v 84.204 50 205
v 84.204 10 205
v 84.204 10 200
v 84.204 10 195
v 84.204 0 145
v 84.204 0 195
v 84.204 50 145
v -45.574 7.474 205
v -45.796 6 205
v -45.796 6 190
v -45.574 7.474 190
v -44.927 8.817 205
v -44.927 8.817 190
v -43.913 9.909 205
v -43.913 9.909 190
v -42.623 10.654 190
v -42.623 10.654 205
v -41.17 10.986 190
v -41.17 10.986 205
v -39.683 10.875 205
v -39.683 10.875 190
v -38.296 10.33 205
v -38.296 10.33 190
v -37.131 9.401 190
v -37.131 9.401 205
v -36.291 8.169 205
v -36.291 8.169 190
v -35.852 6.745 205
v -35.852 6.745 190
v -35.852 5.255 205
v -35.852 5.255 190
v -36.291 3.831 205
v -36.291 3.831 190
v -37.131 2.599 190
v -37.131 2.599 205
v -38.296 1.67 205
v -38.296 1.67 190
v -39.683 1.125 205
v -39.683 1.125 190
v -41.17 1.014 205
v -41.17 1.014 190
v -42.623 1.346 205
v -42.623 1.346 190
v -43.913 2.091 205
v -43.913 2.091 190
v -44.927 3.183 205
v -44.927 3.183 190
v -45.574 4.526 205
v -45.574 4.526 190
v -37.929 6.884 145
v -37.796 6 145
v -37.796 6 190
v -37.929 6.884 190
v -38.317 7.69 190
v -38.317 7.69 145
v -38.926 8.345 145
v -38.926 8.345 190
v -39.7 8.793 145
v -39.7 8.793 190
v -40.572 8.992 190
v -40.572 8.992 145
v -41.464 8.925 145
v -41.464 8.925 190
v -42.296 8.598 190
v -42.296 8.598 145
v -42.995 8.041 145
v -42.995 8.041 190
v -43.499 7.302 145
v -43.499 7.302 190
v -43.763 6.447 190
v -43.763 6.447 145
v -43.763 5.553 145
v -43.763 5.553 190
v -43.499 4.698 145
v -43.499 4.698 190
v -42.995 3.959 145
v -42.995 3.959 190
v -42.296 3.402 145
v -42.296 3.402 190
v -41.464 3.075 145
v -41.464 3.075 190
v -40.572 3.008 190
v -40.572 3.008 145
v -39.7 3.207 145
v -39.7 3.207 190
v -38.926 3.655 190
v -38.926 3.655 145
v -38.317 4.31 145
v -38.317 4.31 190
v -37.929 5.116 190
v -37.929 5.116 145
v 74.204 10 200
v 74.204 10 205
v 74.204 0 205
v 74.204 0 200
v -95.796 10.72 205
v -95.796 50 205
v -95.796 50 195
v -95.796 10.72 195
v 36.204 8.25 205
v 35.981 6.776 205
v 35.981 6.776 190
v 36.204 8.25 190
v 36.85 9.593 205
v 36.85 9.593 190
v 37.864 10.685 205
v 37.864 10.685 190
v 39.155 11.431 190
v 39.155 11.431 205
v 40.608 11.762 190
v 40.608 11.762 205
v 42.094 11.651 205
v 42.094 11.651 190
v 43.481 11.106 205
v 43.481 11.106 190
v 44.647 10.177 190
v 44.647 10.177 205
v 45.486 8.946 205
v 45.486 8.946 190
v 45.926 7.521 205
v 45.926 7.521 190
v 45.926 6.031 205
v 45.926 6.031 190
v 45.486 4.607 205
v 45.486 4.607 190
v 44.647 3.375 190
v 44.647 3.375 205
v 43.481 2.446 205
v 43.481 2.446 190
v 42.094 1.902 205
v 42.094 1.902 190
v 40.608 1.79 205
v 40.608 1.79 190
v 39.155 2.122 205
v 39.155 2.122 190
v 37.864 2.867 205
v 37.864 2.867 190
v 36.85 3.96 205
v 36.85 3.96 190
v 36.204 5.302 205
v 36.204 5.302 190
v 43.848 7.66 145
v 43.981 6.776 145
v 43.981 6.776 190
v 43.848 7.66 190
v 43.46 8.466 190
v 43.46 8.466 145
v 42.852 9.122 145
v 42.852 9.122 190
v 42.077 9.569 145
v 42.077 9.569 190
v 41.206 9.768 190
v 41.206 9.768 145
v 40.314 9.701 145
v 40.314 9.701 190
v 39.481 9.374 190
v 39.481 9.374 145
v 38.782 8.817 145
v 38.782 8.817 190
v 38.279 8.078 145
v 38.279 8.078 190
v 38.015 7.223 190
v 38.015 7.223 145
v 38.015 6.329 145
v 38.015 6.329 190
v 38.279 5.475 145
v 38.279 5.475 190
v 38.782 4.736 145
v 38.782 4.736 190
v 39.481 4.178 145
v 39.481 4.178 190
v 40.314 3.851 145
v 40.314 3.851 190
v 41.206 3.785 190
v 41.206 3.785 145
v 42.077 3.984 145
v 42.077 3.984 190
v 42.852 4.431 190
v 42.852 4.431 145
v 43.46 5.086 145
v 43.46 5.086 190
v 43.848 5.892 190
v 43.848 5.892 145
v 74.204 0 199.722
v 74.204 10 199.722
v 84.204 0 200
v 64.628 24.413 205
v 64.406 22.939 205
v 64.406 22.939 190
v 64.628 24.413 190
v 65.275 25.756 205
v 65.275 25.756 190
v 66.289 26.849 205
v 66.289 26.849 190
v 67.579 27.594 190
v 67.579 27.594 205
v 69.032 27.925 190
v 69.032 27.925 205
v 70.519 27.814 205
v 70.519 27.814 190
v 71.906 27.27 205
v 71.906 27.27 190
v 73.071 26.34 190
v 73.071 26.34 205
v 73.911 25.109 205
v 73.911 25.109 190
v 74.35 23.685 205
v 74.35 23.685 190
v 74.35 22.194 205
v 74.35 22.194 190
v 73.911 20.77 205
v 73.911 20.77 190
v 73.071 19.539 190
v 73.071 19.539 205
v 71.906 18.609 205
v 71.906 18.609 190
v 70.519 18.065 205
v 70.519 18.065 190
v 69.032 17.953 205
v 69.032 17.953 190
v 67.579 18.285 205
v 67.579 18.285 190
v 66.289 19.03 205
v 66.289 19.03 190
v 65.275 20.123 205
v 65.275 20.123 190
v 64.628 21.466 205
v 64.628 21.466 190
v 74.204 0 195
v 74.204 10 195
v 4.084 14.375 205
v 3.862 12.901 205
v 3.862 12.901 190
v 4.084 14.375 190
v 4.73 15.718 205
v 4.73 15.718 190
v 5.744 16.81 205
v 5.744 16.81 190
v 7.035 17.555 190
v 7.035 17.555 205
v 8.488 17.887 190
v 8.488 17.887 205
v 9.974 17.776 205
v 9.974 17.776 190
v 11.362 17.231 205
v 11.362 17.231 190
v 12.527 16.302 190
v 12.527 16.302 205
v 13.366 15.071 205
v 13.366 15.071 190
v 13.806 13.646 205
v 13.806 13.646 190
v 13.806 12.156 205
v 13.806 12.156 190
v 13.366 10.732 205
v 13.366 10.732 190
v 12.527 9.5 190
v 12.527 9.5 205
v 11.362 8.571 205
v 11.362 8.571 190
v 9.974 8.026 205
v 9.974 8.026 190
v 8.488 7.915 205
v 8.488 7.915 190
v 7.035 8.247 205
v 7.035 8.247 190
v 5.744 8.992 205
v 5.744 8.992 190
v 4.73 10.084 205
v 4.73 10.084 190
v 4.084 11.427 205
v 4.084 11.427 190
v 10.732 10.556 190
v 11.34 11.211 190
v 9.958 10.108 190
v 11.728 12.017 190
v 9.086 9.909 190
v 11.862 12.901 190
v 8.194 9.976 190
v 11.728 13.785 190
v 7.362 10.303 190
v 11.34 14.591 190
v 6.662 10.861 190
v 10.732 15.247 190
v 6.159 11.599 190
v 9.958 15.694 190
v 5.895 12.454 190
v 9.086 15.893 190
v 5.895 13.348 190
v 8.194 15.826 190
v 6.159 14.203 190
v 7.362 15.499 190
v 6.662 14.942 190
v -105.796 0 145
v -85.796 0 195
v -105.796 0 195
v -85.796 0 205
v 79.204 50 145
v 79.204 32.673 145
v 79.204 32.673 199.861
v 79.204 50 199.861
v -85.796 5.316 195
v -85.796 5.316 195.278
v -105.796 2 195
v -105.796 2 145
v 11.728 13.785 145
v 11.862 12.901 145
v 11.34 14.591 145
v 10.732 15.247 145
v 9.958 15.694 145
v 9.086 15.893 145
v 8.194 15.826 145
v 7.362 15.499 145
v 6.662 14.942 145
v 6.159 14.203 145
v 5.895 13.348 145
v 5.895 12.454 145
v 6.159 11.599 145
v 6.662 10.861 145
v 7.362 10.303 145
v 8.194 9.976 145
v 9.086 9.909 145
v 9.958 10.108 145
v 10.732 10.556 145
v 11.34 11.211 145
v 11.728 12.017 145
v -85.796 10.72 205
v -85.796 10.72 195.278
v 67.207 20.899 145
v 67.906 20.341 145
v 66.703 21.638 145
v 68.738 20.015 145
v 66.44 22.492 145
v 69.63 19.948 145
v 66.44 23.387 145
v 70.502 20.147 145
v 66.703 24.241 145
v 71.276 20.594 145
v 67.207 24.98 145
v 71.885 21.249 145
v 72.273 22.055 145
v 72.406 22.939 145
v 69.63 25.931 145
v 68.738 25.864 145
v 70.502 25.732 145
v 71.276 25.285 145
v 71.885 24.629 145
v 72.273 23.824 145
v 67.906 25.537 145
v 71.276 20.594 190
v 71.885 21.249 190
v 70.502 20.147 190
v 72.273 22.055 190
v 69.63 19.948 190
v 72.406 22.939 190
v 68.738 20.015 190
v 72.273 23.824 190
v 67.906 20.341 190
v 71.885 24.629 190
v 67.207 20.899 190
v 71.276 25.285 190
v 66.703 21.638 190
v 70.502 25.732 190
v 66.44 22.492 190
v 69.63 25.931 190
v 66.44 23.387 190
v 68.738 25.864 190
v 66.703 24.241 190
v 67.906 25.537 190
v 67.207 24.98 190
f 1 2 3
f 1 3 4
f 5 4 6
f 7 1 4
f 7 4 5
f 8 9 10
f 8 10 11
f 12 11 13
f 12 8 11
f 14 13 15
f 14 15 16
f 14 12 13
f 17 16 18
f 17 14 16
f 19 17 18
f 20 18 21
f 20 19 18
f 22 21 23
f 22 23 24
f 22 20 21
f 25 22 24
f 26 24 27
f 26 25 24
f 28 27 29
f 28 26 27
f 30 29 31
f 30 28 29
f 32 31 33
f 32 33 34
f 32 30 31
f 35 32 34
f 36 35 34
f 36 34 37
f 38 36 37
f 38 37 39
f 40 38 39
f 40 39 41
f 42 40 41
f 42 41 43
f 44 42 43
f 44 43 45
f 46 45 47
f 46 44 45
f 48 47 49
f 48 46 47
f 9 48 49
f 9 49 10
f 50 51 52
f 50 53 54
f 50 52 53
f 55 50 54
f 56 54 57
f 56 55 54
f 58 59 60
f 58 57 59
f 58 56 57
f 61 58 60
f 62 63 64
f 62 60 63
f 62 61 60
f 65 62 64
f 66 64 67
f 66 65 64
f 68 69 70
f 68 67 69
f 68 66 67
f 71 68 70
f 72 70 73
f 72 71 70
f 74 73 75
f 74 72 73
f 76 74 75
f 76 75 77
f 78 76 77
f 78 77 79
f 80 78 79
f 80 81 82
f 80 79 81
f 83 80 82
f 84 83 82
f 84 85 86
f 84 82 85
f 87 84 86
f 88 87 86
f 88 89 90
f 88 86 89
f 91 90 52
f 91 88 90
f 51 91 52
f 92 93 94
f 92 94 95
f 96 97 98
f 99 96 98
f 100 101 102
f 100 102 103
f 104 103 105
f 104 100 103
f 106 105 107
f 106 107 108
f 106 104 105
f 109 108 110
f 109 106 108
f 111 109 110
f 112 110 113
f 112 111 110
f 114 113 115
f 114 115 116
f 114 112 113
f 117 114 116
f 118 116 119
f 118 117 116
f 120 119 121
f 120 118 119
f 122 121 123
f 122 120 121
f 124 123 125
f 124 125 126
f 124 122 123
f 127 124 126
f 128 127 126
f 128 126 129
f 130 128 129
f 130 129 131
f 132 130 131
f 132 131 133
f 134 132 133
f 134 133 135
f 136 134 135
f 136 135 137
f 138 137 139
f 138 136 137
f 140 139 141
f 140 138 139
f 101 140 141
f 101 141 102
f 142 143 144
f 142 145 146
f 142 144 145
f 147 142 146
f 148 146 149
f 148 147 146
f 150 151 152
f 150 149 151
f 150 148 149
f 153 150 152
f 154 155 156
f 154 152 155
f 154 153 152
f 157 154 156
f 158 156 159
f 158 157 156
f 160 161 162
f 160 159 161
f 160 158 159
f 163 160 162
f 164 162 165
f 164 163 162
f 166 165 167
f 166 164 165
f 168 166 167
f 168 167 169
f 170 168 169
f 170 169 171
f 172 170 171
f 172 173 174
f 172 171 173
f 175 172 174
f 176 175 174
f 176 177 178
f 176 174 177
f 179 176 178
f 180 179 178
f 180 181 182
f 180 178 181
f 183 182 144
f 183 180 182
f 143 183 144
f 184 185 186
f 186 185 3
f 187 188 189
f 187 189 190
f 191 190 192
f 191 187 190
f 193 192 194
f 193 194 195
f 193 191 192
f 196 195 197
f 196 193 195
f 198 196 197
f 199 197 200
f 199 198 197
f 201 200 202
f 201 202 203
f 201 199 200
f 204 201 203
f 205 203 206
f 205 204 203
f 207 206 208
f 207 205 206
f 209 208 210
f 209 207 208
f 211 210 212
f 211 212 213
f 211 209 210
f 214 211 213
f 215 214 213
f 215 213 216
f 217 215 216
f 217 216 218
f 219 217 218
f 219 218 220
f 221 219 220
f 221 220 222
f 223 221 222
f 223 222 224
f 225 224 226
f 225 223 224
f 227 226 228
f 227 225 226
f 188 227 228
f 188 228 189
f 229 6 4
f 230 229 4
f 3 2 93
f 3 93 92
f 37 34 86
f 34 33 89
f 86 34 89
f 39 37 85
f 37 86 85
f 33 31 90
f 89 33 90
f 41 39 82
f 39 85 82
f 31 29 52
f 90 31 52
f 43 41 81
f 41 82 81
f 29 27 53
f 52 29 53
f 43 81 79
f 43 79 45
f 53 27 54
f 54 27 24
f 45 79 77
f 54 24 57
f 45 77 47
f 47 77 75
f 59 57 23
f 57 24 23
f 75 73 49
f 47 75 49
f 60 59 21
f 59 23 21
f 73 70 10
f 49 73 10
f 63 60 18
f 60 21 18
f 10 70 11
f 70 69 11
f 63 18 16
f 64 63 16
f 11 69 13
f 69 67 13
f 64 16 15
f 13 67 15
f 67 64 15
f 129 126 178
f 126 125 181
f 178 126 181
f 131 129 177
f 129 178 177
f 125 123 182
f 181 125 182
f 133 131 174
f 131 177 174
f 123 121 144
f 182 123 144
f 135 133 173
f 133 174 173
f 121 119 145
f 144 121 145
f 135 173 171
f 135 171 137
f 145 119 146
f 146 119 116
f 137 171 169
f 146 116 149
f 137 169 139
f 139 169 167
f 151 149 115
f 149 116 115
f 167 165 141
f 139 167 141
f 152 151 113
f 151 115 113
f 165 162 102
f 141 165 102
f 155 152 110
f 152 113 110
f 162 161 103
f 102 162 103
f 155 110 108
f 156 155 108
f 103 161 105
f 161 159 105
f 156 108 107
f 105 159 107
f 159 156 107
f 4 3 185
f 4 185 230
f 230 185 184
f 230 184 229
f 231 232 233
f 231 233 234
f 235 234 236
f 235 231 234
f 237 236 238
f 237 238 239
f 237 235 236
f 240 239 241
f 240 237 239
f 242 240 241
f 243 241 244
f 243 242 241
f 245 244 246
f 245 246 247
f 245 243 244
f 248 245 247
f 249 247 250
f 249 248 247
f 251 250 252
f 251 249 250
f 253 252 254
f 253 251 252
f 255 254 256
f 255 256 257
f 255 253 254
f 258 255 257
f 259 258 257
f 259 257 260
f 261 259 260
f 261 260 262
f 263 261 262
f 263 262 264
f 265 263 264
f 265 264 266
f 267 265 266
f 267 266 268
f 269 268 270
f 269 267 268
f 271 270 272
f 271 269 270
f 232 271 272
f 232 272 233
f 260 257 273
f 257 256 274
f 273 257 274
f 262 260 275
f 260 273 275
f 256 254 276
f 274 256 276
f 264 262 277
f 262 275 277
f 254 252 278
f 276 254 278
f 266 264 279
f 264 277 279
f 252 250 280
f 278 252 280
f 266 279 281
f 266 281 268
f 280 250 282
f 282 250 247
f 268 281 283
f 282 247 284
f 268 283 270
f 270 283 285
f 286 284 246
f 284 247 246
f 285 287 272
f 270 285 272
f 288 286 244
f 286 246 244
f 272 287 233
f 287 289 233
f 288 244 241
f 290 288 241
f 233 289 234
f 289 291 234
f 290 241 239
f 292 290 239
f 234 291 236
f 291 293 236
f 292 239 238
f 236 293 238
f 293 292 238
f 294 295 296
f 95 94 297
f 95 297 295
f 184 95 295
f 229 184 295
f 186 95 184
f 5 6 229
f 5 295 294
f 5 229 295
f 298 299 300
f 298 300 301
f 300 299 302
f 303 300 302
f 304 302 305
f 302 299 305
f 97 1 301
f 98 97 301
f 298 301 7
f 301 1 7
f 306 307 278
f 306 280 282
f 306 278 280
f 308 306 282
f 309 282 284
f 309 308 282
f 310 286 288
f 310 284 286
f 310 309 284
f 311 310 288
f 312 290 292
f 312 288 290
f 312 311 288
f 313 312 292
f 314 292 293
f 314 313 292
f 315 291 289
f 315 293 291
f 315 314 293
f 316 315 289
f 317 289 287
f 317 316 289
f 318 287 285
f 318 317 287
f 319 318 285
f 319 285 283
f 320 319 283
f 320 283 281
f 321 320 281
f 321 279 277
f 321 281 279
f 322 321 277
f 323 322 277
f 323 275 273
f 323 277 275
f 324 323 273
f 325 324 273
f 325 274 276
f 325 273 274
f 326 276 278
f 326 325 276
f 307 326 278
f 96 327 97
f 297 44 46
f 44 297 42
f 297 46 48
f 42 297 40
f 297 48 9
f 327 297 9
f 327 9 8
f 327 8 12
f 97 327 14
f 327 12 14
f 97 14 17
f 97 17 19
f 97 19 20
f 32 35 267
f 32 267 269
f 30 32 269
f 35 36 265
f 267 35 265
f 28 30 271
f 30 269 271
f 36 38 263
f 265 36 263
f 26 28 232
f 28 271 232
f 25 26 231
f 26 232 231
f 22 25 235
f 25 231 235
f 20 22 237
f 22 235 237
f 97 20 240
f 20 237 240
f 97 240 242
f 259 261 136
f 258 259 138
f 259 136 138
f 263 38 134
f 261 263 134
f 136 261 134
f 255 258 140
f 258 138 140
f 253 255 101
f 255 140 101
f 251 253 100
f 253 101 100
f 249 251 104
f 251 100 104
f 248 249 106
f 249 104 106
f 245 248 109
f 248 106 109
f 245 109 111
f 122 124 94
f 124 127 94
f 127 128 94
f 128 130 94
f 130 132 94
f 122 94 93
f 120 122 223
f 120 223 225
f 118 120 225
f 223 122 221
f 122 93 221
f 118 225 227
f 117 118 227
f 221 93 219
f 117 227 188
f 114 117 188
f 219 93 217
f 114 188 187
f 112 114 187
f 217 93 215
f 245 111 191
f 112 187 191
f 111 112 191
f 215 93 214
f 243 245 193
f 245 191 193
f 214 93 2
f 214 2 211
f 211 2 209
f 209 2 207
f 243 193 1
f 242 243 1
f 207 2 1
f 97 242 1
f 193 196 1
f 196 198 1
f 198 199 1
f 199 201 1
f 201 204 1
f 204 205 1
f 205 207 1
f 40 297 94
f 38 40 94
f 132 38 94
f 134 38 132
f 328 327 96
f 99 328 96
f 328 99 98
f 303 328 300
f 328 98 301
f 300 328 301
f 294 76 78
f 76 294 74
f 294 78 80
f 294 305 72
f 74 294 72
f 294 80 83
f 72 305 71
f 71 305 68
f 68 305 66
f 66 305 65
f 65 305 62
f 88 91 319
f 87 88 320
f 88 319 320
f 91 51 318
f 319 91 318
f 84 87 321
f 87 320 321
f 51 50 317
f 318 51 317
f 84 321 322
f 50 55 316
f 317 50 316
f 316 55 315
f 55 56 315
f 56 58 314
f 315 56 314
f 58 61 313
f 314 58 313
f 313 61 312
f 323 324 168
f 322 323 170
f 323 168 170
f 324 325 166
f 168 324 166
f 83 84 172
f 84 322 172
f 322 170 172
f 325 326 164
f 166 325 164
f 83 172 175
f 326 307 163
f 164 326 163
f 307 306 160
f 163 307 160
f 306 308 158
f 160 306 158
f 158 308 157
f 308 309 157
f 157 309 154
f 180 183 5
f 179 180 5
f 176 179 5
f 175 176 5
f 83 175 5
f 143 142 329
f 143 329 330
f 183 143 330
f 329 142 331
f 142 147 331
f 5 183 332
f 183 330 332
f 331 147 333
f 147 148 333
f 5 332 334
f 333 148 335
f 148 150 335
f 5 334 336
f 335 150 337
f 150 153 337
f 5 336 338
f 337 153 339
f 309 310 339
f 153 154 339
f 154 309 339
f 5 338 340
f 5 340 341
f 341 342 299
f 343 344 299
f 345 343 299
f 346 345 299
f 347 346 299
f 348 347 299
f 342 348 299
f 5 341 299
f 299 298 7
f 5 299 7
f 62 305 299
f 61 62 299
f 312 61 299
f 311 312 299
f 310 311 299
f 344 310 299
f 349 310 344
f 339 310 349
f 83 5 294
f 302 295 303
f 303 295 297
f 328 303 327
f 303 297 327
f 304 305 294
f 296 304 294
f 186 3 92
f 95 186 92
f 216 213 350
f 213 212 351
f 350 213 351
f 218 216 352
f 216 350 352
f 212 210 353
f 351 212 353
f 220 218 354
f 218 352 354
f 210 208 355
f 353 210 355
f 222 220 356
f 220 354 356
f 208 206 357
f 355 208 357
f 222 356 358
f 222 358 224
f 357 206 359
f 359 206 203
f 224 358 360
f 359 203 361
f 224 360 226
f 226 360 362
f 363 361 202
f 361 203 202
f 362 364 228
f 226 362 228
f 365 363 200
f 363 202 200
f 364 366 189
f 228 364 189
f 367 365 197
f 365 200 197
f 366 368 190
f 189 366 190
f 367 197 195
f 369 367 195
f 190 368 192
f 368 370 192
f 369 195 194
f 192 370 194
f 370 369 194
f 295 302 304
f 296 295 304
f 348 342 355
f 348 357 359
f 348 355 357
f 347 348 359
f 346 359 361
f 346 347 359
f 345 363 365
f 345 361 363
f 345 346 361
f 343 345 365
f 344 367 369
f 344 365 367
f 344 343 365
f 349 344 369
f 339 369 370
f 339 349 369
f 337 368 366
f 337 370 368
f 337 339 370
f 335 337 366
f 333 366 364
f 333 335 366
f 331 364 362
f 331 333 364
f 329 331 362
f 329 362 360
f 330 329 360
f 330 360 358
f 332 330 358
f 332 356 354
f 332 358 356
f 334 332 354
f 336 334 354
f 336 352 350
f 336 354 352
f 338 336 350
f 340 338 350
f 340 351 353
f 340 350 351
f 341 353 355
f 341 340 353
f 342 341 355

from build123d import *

# Parameters (mm, degrees)
ESQUISSE1_R             = 3
BOSS_EXTRU_1_DEPTH      = 200
ESQUISSE4_W             = 5
ESQUISSE4_H             = 50
BOSS_EXTRU_4_DEPTH      = 180
BOSS_EXTRU_7_DEPTH      = 50
ESQUISSE6_W             = 20
ESQUISSE6_H             = 10.719834163
ENL_V_MAT_EXTRU_2_DEPTH = 10
ESQUISSE5_W             = 10
ESQUISSE5_H             = 10
ENL_V_MAT_EXTRU_1_DEPTH = 10
ESQUISSE14_R            = 5
ENL_V_MAT_EXTRU_4_DEPTH = 15
BOSS_EXTRU_8_REACH      = 242.401
ENL_V_MAT_EXTRU_5_REACH = 238.046
ESQUISSE16_W            = 190
ESQUISSE16_H            = 150


with BuildPart() as part:
    # Esquisse1 → Boss.-Extru.1 (new body)
    with BuildSketch(Plane.XY):
        Polygon((-105.796013405, 0), (84.203986595, 0), (84.203986595, 33.502126335), (-105.796013405, 2), align=None)
        with Locations((69.406004871, 22.939397164)):
            Circle(ESQUISSE1_R, mode=Mode.SUBTRACT)
        with Locations((40.981469067, 6.77616521)):
            Circle(ESQUISSE1_R, mode=Mode.SUBTRACT)
        with Locations((-40.796013405, 6)):
            Circle(ESQUISSE1_R, mode=Mode.SUBTRACT)
        with Locations((8.861542866, 12.901085106)):
            Circle(ESQUISSE1_R, mode=Mode.SUBTRACT)
    extrude(amount=BOSS_EXTRU_1_DEPTH)

    # Esquisse4 → Boss.-Extru.4 (add)
    with BuildSketch(Plane(origin=(84.203986595, 0, 0), x_dir=(0, 0, -1), z_dir=(1, 0, 0))):
        with Locations((-202.5, 25)):
            Rectangle(ESQUISSE4_W, ESQUISSE4_H)
        with Locations((2.5, 25)):
            Rectangle(ESQUISSE4_W, ESQUISSE4_H)
    extrude(amount=-BOSS_EXTRU_4_DEPTH)

    # Esquisse8 → Boss.-Extru.7 (add)
    with BuildSketch(Plane(origin=(0, 50, 0), x_dir=(1, 0, 0), z_dir=(0, 1, 0))):
        Polygon((84.203986595, 0), (-95.796013405, 0), (-95.796013405, -5), align=None)
    boss_extru_7 = extrude(amount=-BOSS_EXTRU_7_DEPTH)

    # Esquisse6 → Enlèv. mat.-Extru.2 (cut)
    with BuildSketch(Plane(origin=(0, 0, -5), x_dir=(-1, 0, 0), z_dir=(0, 0, -1))):
        with Locations((95.796013405, 5.359917081)):
            Rectangle(ESQUISSE6_W, ESQUISSE6_H)
    enl_v_mat_extru_2 = extrude(amount=-ENL_V_MAT_EXTRU_2_DEPTH, mode=Mode.SUBTRACT)

    # Esquisse5 → Enlèv. mat.-Extru.1 (cut)
    with BuildSketch(Plane(origin=(84.203986595, 0, 0), x_dir=(0, 0, -1), z_dir=(1, 0, 0))):
        with Locations((-200, 5)):
            Rectangle(ESQUISSE5_W, ESQUISSE5_H)
        with Locations((0, 5)):
            Rectangle(ESQUISSE5_W, ESQUISSE5_H)
    extrude(amount=-ENL_V_MAT_EXTRU_1_DEPTH, mode=Mode.SUBTRACT)

    # Esquisse14 → Enlèv. mat.-Extru.4 (cut)
    with BuildSketch(Plane(origin=(0, 0, -5), x_dir=(-1, 0, 0), z_dir=(0, 0, -1))):
        with Locations((-69.406004871, 22.939397164)):
            Circle(ESQUISSE14_R)
        with Locations((-40.981469067, 6.77616521)):
            Circle(ESQUISSE14_R)
        with Locations((-8.861542866, 12.901085106)):
            Circle(ESQUISSE14_R)
        with Locations((40.796013405, 6)):
            Circle(ESQUISSE14_R)
    enl_v_mat_extru_4 = extrude(amount=-ENL_V_MAT_EXTRU_4_DEPTH, mode=Mode.SUBTRACT)

    # Symétrie3: Boss.-Extru.7, Enlèv. mat.-Extru.2, Enlèv. mat.-Extru.4 across plane
    add(boss_extru_7.mirror(Plane(origin=(0, 0, 100), x_dir=(1, 0, 0), z_dir=(0, 0, -1))))
    add(enl_v_mat_extru_2.mirror(Plane(origin=(0, 0, 100), x_dir=(1, 0, 0), z_dir=(0, 0, -1))), mode=Mode.SUBTRACT)
    add(enl_v_mat_extru_4.mirror(Plane(origin=(0, 0, 100), x_dir=(1, 0, 0), z_dir=(0, 0, -1))), mode=Mode.SUBTRACT)

    # Boss.-Extru.8: up to this plane
    boss_extru_8_end = Plane(origin=(-95.796013405, -180.069431054, 195), z_dir=(-0.0277670672403533, 0, 0.9996144206527183))
    # Esquisse15 → Boss.-Extru.8 (add, up to the surface)
    with BuildSketch(Plane(origin=(0, 0, -5), x_dir=(-1, 0, 0), z_dir=(0, 0, -1)), mode=Mode.PRIVATE) as boss_extru_8_sk1:
        Polygon((-84.203986595, 33.502126335), (-79.203986595, 32.67312301), (-79.203986595, 50), (-84.203986595, 50), align=None)
    boss_extru_8_tool1 = split(extrude(boss_extru_8_sk1.sketch, amount=-BOSS_EXTRU_8_REACH, mode=Mode.PRIVATE), bisect_by=boss_extru_8_end, keep=Keep.BOTH, mode=Mode.PRIVATE)
    add(boss_extru_8_tool1.solids().sort_by_distance((81.683563, 41.542119, -5))[0])

    # Enlèv. mat.-Extru.5: up to this face of the body (flat: up to its plane)
    enl_v_mat_extru_5_end = Plane(part.part.faces().sort_by_distance((-10.38578146, 0, 100.003530671))[0])
    # Esquisse16 → Enlèv. mat.-Extru.5 (cut, up to the picked face)
    with BuildSketch(Plane(origin=(0, 50, 0), x_dir=(1, 0, 0), z_dir=(0, 1, 0)), mode=Mode.PRIVATE) as enl_v_mat_extru_5_sk1:
        with Locations((-10.796013405, -70)):
            Rectangle(ESQUISSE16_W, ESQUISSE16_H)
    enl_v_mat_extru_5_tool1 = split(extrude(enl_v_mat_extru_5_sk1.sketch, amount=-ENL_V_MAT_EXTRU_5_REACH, mode=Mode.PRIVATE), bisect_by=enl_v_mat_extru_5_end, keep=Keep.BOTH, mode=Mode.PRIVATE)
    add(enl_v_mat_extru_5_tool1.solids().sort_by(Axis((-10.796013, 50, 70), (0, -1, 0)))[0], mode=Mode.SUBTRACT)


solid = part.part
